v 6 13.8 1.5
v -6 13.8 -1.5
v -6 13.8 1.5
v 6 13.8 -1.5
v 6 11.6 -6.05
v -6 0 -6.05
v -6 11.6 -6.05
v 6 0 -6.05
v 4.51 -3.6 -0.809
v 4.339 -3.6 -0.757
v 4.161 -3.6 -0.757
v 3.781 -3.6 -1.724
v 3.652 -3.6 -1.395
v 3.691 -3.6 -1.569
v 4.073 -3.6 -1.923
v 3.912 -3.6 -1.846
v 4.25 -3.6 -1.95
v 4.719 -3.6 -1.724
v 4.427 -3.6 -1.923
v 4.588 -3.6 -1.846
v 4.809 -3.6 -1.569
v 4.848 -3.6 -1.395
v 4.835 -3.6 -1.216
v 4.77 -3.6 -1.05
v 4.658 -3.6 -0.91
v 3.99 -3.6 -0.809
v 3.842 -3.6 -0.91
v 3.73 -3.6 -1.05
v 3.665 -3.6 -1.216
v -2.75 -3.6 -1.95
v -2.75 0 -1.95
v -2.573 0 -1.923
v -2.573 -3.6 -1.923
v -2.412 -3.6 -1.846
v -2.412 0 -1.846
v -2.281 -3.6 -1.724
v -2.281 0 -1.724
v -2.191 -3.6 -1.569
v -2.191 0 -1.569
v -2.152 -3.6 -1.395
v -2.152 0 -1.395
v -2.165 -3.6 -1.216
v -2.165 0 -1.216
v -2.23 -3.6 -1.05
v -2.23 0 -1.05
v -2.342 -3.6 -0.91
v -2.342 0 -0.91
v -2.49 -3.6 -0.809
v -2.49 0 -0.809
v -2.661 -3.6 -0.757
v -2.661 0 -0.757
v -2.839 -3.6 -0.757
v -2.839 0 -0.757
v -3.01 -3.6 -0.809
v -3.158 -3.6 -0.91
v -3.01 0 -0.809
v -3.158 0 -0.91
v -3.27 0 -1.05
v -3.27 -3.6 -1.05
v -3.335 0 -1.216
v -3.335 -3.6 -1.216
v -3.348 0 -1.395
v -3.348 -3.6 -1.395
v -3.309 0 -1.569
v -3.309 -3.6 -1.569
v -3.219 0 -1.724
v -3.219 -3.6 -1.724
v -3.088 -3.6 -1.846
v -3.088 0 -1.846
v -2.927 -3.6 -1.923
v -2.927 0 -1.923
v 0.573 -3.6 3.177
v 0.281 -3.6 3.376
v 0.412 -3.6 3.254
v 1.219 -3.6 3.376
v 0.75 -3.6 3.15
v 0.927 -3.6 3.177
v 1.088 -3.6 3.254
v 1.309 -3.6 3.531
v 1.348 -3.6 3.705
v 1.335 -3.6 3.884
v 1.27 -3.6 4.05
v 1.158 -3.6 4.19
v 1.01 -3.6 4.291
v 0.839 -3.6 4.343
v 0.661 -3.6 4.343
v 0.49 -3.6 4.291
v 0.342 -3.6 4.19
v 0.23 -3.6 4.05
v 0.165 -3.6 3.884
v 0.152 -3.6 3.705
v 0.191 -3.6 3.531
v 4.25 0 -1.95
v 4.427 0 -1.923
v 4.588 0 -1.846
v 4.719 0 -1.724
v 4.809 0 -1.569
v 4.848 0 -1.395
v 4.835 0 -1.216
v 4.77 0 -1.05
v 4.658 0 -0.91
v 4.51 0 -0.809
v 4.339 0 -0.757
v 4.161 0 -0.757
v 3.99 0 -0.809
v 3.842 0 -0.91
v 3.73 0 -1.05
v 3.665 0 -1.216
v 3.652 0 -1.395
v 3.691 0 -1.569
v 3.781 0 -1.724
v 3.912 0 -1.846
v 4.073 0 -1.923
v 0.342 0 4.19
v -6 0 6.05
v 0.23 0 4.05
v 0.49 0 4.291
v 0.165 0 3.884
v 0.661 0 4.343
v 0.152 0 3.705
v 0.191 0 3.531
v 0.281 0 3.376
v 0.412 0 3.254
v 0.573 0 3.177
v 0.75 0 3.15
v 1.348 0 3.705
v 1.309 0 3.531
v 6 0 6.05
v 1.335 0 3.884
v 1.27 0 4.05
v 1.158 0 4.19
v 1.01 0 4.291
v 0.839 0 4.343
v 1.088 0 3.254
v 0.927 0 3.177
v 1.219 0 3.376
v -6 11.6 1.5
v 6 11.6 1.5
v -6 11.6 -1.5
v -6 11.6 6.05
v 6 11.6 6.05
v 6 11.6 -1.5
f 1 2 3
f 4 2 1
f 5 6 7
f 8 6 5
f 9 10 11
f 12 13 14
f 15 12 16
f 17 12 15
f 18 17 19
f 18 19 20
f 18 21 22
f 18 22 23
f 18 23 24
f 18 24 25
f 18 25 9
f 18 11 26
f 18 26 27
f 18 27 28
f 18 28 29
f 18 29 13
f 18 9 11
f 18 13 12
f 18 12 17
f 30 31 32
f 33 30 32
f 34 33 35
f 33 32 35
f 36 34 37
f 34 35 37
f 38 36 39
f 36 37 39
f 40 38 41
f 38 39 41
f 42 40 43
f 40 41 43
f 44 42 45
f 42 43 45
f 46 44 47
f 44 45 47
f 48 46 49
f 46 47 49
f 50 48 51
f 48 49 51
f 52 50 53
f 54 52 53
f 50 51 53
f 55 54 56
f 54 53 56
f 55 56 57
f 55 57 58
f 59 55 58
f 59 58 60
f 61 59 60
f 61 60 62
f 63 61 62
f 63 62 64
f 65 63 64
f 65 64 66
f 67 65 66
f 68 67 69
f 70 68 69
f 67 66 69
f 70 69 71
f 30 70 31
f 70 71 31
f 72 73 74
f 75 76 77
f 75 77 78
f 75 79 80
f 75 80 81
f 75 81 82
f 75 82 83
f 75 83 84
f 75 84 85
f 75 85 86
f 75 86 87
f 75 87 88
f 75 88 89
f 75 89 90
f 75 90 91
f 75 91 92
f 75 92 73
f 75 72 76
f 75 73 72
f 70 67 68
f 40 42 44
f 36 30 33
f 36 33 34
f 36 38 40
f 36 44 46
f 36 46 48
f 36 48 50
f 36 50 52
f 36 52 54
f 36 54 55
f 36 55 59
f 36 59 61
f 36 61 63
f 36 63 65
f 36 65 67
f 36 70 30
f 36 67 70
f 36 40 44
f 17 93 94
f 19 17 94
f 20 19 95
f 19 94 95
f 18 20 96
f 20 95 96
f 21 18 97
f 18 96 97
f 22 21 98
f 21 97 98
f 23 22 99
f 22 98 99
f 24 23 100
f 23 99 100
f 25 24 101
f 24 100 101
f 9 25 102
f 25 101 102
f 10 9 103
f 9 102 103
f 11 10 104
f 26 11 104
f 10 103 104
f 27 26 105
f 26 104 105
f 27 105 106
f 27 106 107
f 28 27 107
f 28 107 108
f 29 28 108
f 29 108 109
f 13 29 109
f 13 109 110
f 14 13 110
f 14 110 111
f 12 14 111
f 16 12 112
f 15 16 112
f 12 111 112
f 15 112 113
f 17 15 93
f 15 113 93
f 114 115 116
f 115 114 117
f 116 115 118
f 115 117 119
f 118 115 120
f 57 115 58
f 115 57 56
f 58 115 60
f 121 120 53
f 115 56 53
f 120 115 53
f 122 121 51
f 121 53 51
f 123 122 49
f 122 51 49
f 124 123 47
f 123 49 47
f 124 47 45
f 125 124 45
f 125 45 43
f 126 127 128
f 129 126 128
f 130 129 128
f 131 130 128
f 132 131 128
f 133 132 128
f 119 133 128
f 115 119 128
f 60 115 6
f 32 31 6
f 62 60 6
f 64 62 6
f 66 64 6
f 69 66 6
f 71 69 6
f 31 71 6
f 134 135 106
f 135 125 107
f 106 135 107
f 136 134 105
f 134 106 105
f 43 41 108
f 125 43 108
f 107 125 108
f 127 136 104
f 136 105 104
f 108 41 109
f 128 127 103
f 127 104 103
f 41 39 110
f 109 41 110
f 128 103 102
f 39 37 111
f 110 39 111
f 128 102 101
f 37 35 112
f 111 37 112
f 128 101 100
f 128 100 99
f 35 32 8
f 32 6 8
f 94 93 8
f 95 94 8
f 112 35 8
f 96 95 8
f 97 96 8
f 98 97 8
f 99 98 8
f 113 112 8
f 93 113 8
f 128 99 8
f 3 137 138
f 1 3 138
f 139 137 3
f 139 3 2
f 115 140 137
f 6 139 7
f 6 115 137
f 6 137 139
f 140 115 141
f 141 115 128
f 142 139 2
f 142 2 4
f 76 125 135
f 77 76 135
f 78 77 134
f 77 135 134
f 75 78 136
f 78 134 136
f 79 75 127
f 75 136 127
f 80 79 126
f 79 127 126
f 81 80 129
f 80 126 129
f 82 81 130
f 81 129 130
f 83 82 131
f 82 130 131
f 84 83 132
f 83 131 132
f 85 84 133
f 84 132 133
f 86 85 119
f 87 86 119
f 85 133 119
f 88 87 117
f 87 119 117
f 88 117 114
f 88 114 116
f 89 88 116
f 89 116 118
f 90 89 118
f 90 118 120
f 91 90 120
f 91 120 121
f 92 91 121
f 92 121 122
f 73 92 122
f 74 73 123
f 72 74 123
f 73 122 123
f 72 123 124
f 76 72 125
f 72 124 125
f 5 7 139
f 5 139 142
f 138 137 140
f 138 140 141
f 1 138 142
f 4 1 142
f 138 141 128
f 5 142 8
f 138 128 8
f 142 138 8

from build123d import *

# Parameters (mm, degrees)
CROQUIS1_W              = 12
CROQUIS1_H              = 12.1
SALIENTE_EXTRUIR1_DEPTH = 11.6
CROQUIS2_W              = 12
CROQUIS2_H              = 3
SALIENTE_EXTRUIR2_DEPTH = 2.2
CROQUIS3_R              = 0.6
SALIENTE_EXTRUIR3_DEPTH = 3.6


with BuildPart() as part:
    # Croquis1 → Saliente-Extruir1 (new body)
    with BuildSketch(Plane(origin=(0, 0, 0), x_dir=(1, 0, 0), z_dir=(0, 1, 0))):
        Rectangle(CROQUIS1_W, CROQUIS1_H)
    extrude(amount=SALIENTE_EXTRUIR1_DEPTH)

    # Croquis2 → Saliente-Extruir2 (add)
    with BuildSketch(Plane(origin=(0, 11.6, 0), x_dir=(1, 0, 0), z_dir=(0, 1, 0))):
        Rectangle(CROQUIS2_W, CROQUIS2_H)
    extrude(amount=SALIENTE_EXTRUIR2_DEPTH)

    # Croquis3 → Saliente-Extruir3 (add)
    with BuildSketch(Plane.XZ):
        with Locations(Location((-2.75, -1.35, 0), (0, 0, 270))):
            Circle(CROQUIS3_R)
        with Locations(Location((0.75, 3.75, 0), (0, 0, 270))):
            Circle(CROQUIS3_R)
        with Locations(Location((4.25, -1.35, 0), (0, 0, 270))):
            Circle(CROQUIS3_R)
    extrude(amount=SALIENTE_EXTRUIR3_DEPTH)


solid = part.part
